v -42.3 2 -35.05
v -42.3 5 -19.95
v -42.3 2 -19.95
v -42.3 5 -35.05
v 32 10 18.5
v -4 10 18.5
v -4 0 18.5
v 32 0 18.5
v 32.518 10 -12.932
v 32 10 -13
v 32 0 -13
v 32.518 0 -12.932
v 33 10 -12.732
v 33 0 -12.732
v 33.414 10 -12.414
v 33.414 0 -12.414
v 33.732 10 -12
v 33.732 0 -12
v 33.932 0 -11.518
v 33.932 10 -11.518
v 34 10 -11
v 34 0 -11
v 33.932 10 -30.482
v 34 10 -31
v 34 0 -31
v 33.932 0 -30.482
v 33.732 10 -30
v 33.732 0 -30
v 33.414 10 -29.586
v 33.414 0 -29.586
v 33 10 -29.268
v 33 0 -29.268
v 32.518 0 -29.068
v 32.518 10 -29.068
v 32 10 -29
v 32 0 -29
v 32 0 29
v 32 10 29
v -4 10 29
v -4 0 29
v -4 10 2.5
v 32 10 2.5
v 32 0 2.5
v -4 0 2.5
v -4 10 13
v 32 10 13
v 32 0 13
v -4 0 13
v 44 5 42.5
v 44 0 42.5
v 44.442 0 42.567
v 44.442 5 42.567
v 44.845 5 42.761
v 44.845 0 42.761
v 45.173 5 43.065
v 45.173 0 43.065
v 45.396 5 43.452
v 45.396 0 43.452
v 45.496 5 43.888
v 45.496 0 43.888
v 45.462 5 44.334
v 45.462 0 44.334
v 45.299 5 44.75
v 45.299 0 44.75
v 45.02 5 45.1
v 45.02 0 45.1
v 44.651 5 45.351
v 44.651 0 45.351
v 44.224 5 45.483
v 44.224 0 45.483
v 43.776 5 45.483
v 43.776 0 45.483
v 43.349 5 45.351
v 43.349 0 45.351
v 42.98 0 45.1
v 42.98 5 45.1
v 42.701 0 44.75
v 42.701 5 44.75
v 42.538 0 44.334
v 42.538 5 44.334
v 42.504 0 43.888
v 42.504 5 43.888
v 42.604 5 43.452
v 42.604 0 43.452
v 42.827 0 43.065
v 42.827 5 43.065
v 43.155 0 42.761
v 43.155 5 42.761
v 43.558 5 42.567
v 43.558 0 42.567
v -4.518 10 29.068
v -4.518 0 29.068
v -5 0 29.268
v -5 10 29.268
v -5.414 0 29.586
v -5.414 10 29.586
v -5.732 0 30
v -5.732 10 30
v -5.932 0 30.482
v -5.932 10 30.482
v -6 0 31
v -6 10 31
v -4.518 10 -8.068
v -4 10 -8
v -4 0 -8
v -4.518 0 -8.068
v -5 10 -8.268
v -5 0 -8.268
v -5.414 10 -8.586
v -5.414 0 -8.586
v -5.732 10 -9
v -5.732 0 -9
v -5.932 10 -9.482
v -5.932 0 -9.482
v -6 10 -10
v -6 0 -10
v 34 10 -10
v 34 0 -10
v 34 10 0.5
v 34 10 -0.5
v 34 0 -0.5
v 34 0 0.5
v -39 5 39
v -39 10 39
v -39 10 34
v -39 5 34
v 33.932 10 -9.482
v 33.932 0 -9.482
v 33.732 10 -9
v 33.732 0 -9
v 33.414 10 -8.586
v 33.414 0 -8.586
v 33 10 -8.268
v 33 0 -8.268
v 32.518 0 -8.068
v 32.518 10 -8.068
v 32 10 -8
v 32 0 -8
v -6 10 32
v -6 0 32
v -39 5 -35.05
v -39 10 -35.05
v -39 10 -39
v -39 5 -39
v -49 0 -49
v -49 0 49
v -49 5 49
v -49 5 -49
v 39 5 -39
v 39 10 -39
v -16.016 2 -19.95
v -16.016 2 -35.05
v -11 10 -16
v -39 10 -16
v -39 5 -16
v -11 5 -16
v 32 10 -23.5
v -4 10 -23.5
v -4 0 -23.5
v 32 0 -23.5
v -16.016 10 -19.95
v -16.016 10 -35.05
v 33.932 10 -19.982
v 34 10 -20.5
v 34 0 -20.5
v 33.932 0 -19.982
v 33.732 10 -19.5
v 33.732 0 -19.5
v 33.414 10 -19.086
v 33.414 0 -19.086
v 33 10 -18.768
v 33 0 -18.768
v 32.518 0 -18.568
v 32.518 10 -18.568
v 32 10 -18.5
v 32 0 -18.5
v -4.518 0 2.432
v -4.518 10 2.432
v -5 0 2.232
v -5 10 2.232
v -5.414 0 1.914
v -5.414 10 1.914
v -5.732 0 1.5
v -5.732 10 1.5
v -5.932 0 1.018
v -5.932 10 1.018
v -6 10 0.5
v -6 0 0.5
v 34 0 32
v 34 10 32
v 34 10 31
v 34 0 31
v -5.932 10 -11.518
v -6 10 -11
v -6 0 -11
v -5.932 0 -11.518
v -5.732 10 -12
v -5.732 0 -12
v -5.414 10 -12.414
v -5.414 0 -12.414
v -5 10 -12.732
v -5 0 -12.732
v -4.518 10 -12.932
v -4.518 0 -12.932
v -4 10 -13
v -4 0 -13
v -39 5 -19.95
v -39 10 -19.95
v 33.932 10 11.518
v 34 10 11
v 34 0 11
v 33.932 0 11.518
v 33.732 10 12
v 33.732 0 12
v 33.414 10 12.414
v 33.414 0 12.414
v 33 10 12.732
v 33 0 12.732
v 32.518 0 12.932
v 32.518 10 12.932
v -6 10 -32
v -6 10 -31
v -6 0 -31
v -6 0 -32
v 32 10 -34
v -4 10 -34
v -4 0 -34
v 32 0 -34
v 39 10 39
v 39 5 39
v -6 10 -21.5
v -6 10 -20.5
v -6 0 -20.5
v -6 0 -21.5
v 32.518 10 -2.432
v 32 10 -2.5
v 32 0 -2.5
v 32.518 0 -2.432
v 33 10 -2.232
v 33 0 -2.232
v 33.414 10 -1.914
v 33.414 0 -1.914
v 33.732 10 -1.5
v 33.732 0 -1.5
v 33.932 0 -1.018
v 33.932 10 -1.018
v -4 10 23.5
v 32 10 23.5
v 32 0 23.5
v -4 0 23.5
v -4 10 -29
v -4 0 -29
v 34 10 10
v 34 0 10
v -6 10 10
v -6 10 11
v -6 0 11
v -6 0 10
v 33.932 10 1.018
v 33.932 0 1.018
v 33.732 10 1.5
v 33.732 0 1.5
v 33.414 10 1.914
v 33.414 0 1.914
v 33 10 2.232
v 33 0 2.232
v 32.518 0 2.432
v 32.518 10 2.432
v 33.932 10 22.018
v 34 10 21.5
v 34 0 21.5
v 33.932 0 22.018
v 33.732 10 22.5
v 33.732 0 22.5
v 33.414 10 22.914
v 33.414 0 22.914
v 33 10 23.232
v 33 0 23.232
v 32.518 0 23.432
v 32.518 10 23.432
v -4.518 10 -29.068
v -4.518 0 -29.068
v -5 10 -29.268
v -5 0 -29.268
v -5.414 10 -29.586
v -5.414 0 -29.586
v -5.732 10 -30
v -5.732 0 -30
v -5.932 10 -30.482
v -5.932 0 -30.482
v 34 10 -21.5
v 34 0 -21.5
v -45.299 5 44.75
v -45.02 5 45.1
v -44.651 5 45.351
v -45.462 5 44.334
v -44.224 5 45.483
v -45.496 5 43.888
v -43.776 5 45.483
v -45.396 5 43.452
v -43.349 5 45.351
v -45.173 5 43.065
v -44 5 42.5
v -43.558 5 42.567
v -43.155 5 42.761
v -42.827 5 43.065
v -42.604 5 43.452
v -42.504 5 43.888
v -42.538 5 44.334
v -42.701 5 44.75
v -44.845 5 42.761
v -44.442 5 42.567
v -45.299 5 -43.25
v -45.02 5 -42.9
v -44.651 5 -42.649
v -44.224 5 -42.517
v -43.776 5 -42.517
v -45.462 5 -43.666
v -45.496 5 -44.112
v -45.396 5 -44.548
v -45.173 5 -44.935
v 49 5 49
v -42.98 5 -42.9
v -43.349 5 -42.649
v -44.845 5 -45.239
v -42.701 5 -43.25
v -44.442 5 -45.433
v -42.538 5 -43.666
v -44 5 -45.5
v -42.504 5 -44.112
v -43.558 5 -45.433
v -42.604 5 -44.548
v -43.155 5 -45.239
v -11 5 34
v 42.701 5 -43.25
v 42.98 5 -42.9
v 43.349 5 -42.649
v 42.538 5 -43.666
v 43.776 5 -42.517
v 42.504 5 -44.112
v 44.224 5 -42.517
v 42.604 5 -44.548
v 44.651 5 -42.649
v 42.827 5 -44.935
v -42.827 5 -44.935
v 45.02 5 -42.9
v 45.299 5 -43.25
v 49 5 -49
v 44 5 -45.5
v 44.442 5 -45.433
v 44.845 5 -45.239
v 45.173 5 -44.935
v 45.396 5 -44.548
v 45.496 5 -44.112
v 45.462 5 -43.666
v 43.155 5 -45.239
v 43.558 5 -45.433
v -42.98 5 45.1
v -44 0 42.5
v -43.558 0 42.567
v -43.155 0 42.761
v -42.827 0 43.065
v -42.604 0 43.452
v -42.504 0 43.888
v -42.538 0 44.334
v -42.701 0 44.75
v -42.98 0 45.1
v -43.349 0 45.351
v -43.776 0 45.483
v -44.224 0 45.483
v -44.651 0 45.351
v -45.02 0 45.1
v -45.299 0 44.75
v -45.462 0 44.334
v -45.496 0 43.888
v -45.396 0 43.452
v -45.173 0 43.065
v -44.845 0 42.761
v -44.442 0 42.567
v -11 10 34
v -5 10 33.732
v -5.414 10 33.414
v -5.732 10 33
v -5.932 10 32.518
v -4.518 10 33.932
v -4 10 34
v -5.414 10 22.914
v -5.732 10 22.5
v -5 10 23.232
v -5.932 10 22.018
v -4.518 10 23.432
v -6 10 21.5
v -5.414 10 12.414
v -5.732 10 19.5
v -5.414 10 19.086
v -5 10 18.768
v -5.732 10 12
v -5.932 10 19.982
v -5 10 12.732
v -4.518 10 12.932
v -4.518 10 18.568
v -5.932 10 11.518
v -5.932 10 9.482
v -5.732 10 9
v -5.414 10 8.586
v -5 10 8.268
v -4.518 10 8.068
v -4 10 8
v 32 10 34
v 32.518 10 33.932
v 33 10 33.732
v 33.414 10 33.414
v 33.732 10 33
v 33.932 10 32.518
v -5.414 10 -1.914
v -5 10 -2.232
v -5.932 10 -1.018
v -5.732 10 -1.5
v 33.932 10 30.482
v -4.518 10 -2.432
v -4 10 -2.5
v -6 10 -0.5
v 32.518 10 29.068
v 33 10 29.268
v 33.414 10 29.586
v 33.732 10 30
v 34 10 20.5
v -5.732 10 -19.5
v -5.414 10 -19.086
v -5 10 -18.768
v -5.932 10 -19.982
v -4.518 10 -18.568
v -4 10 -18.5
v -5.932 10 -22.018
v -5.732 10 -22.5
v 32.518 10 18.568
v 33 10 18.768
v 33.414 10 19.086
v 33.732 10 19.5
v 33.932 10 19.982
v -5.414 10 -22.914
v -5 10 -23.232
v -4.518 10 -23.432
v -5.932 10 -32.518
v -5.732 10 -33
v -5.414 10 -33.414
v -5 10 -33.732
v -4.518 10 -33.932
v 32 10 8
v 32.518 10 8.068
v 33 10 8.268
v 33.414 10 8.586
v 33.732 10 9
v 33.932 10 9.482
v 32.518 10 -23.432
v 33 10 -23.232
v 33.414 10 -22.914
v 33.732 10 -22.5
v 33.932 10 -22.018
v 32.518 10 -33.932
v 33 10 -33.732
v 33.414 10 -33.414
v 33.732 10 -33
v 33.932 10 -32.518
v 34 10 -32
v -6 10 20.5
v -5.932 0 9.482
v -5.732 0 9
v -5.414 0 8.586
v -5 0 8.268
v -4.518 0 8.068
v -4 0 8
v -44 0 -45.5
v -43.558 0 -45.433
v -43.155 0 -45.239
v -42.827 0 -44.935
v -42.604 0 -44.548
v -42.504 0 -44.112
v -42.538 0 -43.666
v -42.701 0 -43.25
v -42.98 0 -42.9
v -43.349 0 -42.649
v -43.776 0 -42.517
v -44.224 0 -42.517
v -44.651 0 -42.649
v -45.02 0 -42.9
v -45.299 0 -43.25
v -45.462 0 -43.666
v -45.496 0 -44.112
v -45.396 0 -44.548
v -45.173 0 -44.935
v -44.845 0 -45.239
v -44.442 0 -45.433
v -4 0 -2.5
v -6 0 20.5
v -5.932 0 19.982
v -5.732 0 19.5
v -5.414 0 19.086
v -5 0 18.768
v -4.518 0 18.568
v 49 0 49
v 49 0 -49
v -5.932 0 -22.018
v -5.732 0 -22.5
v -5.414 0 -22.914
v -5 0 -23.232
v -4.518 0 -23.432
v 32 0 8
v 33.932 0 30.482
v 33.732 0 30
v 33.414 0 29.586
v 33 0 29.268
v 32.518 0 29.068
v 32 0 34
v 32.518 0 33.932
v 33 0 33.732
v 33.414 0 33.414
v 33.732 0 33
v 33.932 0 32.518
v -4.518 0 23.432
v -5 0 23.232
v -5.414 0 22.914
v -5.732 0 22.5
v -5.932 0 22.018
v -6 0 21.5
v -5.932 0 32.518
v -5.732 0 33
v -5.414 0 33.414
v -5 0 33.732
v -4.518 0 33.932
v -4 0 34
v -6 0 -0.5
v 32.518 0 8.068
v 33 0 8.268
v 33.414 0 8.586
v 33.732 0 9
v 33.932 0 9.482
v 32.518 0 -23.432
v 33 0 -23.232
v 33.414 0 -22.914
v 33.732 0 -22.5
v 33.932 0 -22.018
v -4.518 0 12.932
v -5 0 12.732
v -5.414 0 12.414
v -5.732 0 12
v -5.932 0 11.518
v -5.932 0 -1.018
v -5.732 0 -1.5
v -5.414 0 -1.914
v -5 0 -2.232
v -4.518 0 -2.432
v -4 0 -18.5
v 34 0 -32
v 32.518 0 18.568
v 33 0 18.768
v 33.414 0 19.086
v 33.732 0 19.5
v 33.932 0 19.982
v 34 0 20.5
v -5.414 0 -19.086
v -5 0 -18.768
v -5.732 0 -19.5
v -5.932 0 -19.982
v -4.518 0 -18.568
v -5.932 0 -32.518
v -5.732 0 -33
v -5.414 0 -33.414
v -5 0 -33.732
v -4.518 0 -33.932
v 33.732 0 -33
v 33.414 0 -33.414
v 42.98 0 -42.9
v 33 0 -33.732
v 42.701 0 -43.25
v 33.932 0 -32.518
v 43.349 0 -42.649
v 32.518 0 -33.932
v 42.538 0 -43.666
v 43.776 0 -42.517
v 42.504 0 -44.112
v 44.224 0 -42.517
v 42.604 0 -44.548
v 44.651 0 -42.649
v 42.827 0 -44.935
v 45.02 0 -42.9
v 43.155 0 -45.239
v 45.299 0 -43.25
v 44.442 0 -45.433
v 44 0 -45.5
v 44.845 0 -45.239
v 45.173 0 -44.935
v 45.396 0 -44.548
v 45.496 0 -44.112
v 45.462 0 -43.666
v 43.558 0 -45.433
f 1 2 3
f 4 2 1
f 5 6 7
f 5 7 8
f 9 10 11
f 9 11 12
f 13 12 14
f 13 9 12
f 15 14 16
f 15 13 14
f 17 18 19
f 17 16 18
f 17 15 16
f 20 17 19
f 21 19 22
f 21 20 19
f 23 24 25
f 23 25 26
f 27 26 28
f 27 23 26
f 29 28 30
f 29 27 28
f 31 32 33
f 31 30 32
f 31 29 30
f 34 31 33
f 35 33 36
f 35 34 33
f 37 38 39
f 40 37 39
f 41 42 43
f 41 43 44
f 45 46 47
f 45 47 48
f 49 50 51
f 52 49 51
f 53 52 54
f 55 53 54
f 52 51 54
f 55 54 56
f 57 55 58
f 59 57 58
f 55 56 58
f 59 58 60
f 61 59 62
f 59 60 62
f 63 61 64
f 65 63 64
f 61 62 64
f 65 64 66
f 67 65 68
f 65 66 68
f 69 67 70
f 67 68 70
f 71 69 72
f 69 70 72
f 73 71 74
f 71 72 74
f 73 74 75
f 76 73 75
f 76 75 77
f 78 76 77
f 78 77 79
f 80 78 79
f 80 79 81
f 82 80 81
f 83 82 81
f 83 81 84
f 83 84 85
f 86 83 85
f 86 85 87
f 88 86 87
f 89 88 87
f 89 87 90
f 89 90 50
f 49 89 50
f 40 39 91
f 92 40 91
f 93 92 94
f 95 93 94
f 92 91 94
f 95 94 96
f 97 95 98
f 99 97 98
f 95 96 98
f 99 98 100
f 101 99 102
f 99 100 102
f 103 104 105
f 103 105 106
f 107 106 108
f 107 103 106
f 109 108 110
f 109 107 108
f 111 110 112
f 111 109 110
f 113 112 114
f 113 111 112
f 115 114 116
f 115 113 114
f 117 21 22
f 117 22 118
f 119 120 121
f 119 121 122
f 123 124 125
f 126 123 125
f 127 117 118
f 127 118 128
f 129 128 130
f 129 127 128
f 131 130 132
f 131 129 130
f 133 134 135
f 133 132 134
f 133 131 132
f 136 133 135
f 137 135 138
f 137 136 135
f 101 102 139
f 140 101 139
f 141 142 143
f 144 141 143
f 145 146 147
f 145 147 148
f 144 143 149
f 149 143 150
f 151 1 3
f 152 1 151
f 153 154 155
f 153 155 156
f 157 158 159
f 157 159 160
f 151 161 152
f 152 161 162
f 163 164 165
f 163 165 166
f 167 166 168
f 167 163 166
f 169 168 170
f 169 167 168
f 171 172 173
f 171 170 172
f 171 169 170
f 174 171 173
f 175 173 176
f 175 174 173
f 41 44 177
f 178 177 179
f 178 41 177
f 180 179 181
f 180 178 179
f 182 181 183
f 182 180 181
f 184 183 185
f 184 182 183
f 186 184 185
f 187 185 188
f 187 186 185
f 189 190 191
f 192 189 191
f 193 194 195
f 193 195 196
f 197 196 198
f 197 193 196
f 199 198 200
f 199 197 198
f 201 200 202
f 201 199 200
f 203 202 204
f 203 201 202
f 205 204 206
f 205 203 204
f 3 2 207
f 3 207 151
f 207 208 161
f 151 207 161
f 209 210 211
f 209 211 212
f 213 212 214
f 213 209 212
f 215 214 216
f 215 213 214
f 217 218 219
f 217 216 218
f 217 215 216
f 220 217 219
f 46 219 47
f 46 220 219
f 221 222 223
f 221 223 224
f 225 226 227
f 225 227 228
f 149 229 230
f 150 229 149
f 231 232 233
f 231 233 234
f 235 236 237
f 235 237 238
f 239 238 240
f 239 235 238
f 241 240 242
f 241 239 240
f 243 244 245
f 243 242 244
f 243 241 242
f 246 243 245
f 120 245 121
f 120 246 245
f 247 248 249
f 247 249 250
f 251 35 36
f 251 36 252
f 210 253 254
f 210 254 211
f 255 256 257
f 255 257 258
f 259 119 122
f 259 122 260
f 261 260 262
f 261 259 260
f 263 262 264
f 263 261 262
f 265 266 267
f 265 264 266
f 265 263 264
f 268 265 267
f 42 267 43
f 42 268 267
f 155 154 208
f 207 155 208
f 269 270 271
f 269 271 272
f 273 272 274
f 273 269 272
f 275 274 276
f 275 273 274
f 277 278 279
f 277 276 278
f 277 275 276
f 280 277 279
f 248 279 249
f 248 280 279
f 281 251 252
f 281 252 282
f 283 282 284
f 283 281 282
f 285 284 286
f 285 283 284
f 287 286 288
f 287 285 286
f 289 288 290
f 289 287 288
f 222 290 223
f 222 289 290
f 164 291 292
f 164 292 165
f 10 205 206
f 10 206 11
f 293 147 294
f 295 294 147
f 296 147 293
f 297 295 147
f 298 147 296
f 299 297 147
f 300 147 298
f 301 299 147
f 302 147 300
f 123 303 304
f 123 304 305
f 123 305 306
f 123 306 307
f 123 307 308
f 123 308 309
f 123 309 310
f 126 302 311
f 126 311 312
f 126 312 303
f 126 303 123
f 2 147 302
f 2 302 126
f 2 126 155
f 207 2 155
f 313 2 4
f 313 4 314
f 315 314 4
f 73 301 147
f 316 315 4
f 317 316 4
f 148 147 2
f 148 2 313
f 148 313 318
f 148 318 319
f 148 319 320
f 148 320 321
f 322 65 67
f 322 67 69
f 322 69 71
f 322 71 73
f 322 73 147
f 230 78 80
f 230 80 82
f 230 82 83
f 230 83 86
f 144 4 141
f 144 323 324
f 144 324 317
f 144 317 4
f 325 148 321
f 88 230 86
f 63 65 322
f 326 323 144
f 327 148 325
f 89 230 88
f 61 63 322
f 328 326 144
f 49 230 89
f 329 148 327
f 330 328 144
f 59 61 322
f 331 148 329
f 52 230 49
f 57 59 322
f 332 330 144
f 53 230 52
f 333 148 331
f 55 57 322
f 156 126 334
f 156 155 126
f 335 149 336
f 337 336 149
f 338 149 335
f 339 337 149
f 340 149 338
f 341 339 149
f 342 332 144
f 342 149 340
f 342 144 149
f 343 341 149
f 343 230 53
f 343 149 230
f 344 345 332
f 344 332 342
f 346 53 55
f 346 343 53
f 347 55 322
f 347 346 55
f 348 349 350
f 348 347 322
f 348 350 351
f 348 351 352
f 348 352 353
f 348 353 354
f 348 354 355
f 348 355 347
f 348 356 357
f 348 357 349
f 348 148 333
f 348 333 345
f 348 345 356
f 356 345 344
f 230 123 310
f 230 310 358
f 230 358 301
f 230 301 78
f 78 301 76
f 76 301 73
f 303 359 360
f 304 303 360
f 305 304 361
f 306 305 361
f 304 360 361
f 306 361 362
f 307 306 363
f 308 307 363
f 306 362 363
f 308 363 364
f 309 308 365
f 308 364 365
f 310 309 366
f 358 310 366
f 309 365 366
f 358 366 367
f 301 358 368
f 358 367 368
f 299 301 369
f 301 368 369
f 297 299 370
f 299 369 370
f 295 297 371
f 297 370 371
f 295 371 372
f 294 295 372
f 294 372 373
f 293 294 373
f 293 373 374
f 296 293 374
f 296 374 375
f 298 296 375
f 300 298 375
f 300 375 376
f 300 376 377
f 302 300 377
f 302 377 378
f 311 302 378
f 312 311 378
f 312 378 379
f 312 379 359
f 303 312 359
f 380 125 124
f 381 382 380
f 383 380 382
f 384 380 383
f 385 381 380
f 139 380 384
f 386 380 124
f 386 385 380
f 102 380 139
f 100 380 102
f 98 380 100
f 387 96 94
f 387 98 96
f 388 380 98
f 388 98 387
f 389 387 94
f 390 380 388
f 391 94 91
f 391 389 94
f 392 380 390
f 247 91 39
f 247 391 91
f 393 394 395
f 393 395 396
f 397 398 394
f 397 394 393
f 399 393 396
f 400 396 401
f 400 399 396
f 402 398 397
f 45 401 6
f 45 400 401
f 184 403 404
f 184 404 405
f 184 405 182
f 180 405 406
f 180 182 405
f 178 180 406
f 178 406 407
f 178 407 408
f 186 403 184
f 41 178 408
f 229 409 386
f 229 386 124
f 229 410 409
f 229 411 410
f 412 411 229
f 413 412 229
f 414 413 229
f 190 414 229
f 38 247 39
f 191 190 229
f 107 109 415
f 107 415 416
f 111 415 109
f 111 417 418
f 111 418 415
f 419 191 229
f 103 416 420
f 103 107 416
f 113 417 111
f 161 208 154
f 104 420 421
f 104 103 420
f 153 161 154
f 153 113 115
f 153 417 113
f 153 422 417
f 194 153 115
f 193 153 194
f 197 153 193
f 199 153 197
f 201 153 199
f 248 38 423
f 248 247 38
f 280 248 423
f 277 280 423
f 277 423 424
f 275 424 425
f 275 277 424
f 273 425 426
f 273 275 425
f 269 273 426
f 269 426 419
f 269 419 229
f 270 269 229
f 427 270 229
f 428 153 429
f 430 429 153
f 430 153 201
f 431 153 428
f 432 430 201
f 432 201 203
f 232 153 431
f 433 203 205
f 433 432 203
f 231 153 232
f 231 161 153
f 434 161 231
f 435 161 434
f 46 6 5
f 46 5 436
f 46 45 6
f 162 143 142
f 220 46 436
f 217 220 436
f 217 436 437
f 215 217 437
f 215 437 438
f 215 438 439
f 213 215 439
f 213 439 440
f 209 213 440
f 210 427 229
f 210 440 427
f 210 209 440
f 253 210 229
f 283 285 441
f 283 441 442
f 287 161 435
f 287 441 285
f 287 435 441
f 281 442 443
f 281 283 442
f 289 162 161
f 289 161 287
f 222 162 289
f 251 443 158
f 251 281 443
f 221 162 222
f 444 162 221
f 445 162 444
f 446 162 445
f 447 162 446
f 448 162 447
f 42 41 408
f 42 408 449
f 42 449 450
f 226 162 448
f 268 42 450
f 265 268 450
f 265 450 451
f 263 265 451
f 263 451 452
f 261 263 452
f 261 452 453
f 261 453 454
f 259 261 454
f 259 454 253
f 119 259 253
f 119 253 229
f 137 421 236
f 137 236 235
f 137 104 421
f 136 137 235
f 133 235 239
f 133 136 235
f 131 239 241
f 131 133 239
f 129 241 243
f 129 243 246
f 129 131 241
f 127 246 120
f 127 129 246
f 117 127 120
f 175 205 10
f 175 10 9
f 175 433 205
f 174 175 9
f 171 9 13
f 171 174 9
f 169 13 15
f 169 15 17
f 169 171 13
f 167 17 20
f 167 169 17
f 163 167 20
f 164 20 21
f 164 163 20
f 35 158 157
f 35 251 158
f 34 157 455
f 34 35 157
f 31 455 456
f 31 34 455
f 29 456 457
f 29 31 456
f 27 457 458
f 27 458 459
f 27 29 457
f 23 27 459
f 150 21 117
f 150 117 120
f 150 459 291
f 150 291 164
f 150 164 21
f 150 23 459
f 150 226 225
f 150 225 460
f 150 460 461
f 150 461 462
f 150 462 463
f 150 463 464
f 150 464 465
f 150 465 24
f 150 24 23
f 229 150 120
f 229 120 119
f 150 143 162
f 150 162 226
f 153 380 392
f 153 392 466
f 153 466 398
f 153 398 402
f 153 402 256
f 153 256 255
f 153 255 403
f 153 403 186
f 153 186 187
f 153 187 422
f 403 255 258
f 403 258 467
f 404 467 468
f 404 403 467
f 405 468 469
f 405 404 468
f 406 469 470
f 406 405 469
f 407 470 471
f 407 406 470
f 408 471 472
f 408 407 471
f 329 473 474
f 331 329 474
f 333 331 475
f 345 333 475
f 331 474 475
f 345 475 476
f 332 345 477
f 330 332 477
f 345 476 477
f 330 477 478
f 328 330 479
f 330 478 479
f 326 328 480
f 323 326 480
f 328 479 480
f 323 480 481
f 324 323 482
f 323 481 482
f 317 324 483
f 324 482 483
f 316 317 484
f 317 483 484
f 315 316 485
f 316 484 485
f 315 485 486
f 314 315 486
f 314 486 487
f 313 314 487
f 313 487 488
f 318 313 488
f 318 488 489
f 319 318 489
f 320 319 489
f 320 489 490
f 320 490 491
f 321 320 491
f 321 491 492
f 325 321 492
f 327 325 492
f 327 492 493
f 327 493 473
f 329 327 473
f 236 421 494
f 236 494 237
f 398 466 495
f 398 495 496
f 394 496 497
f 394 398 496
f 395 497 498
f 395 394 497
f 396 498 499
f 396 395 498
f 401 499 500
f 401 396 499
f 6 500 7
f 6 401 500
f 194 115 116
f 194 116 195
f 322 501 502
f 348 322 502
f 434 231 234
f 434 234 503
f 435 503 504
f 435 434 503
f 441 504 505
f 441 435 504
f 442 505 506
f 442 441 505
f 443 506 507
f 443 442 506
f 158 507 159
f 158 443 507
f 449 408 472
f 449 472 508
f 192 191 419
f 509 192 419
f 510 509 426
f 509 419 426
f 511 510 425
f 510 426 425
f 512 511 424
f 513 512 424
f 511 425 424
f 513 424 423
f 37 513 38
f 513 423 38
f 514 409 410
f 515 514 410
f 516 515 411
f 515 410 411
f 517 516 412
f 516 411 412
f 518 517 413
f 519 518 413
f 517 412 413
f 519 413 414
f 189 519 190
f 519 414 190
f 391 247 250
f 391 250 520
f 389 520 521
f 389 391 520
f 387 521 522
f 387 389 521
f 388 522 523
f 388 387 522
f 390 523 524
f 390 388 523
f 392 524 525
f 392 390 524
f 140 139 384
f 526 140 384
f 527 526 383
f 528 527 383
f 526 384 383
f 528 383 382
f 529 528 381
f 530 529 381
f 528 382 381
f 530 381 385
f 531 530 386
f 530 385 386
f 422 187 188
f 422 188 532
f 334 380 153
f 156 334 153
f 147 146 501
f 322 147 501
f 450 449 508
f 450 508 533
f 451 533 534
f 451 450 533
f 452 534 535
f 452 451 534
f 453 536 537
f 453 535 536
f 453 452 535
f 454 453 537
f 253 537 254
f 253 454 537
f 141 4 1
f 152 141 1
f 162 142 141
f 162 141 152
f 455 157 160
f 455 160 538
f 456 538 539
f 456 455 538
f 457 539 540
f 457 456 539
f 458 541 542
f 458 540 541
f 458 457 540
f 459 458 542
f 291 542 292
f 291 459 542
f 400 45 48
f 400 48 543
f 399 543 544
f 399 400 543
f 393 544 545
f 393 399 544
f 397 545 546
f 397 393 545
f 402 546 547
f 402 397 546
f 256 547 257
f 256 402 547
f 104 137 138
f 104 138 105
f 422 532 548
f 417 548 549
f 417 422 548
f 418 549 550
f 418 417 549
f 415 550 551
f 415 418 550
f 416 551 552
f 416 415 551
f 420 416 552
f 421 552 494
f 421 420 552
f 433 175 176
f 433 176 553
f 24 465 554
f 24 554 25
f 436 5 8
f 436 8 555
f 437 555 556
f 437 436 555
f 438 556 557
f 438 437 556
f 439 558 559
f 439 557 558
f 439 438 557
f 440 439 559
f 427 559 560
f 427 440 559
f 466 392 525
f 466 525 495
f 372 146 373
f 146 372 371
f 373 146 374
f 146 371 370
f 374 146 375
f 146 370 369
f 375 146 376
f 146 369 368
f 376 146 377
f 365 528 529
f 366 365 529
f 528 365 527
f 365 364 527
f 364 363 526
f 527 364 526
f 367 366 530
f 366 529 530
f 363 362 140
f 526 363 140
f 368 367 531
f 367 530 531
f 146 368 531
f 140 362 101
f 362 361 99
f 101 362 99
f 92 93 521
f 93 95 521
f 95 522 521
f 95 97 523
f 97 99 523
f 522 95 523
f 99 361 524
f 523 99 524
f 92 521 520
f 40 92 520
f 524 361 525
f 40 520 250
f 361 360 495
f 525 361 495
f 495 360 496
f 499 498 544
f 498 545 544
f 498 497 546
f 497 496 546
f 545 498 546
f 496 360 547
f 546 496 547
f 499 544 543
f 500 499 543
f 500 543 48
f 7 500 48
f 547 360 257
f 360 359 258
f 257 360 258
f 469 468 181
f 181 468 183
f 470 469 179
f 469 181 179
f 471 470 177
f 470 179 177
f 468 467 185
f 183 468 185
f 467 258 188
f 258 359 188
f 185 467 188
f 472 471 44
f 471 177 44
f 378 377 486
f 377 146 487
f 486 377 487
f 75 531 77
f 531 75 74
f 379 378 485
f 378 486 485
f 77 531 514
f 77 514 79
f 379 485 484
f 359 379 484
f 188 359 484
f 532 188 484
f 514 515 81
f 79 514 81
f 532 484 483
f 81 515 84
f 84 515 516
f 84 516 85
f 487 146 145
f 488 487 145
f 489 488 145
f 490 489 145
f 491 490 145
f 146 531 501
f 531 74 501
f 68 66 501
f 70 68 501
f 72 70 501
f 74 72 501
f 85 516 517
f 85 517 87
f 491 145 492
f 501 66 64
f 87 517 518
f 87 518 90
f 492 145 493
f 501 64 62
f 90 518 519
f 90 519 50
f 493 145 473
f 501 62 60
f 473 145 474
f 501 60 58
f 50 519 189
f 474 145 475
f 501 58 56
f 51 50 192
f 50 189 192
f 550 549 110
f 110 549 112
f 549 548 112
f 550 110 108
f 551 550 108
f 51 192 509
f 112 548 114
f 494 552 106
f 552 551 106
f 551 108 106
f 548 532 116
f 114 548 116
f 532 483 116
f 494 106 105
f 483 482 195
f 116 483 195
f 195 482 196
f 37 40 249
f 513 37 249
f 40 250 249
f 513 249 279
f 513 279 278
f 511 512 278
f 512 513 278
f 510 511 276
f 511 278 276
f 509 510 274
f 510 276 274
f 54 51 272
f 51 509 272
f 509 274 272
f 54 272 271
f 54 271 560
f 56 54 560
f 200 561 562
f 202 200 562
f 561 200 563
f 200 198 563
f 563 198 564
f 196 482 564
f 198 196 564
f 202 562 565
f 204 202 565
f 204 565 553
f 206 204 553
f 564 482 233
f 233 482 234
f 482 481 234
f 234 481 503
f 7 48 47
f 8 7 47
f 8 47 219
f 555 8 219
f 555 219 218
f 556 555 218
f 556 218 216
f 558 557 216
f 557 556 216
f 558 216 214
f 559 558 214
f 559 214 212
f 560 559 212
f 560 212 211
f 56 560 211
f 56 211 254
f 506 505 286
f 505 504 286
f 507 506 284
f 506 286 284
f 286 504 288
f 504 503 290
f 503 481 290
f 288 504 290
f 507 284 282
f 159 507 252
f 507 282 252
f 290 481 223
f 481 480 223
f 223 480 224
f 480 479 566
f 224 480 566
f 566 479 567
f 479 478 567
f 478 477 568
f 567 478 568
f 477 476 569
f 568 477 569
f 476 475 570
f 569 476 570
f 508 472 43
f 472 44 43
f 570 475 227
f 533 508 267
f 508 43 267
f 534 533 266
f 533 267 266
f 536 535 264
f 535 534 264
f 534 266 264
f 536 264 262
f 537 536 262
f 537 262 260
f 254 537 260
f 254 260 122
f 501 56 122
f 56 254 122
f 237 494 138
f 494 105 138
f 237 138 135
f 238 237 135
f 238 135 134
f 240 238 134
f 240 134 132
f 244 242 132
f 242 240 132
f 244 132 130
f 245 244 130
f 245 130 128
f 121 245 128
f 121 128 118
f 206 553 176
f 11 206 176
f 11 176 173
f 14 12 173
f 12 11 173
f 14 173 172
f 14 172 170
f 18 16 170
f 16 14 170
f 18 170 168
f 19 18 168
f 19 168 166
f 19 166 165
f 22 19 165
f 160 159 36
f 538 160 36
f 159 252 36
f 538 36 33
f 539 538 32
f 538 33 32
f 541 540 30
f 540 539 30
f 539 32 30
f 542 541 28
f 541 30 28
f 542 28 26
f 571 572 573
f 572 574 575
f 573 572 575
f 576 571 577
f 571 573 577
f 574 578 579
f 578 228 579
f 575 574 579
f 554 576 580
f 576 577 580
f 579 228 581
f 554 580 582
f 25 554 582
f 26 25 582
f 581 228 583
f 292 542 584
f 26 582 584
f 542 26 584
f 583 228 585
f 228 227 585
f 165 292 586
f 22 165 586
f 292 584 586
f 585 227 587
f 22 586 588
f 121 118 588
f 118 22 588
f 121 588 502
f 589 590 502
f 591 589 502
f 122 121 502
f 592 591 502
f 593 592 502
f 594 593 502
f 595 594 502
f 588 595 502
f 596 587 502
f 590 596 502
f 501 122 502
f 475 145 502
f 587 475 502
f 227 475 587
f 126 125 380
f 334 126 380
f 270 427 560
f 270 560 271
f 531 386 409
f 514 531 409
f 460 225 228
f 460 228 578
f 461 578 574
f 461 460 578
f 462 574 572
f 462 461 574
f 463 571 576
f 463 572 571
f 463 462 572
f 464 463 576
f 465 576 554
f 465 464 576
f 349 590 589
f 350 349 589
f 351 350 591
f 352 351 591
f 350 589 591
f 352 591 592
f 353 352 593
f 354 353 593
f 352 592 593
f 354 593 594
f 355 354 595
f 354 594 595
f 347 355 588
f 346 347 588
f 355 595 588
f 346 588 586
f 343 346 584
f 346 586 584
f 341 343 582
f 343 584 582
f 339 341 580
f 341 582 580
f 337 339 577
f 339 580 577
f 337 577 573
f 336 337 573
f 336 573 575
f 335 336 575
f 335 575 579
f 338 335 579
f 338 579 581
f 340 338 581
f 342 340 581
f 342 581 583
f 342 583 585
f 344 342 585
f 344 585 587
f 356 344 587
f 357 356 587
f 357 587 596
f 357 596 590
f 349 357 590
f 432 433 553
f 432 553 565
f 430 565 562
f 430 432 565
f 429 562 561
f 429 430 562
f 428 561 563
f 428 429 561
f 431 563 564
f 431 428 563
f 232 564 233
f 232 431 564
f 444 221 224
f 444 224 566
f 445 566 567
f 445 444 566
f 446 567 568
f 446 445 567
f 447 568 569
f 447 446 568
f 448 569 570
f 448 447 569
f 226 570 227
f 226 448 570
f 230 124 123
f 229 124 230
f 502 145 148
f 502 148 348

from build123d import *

# Parameters (mm, degrees)
SKETCH1_W           = 98
SKETCH1_H           = 98
BOSS_EXTRUDE1_DEPTH = 10
SKETCH8_W           = 98
SKETCH8_H           = 98
SKETCH8_W_2         = 78
SKETCH8_H_2         = 78
CUT_EXTRUDE5_DEPTH  = 5
SKETCH9_W           = 28
SKETCH9_H           = 50
CUT_EXTRUDE6_DEPTH  = 5
SKETCH11_W          = 22.983747508
SKETCH11_H          = 15.1
CUT_EXTRUDE7_DEPTH  = 8
SKETCH12_W          = 3.3
SKETCH12_H          = 15.1
CUT_EXTRUDE8_DEPTH  = 3
CUT_EXTRUDE10_DEPTH = 16
SKETCH14_R          = 1.5
CUT_EXTRUDE11_DEPTH = 10


with BuildPart() as part:
    # Sketch1 → Boss-Extrude1 (new body)
    with BuildSketch(Plane(origin=(0, 0, 0), x_dir=(1, 0, 0), z_dir=(0, 1, 0))):
        Rectangle(SKETCH1_W, SKETCH1_H)
    extrude(amount=BOSS_EXTRUDE1_DEPTH)

    # Sketch8 → Cut-Extrude5 (cut)
    with BuildSketch(Plane(origin=(0, 10, 0), x_dir=(1, 0, 0), z_dir=(0, 1, 0))):
        Rectangle(SKETCH8_W, SKETCH8_H)
        Rectangle(SKETCH8_W_2, SKETCH8_H_2, mode=Mode.SUBTRACT)
    extrude(amount=-CUT_EXTRUDE5_DEPTH, mode=Mode.SUBTRACT)

    # Sketch9 → Cut-Extrude6 (cut)
    with BuildSketch(Plane(origin=(0, 10, 0), x_dir=(1, 0, 0), z_dir=(0, 1, 0))):
        with Locations((-25, -9)):
            Rectangle(SKETCH9_W, SKETCH9_H)
    extrude(amount=-CUT_EXTRUDE6_DEPTH, mode=Mode.SUBTRACT)

    # Sketch11 → Cut-Extrude7 (cut)
    with BuildSketch(Plane(origin=(0, 10, 0), x_dir=(1, 0, 0), z_dir=(0, 1, 0))):
        with Locations((-27.508126246, 27.5)):
            Rectangle(SKETCH11_W, SKETCH11_H)
    extrude(amount=-CUT_EXTRUDE7_DEPTH, mode=Mode.SUBTRACT)

    # Sketch12 → Cut-Extrude8 (cut)
    with BuildSketch(Plane(origin=(0, 5, 0), x_dir=(1, 0, 0), z_dir=(0, 1, 0))):
        with Locations((-40.65, 27.5)):
            Rectangle(SKETCH12_W, SKETCH12_H)
    extrude(amount=-CUT_EXTRUDE8_DEPTH, mode=Mode.SUBTRACT)

    # Sketch13 → Cut-Extrude10 (cut)
    with BuildSketch(Plane(origin=(0, 10, 0), x_dir=(1, 0, 0), z_dir=(0, 1, 0))):
        with BuildLine():
            Line((-4, -18.5), (32, -18.5))
            ThreePointArc((32, -18.5), (33.414213562, -19.085786438), (34, -20.5))
            Line((34, -20.5), (34, -21.5))
            ThreePointArc((34, -21.5), (33.414213562, -22.914213562), (32, -23.5))
            Line((32, -23.5), (-4, -23.5))
            ThreePointArc((-4, -23.5), (-5.414213562, -22.914213562), (-6, -21.5))
            Line((-6, -21.5), (-6, -20.5))
            ThreePointArc((-6, -20.5), (-5.414213562, -19.085786438), (-4, -18.5))
        make_face()
        with BuildLine():
            Line((-4, -34), (32, -34))
            ThreePointArc((32, -34), (33.414213562, -33.414213562), (34, -32))
            Line((34, -32), (34, -31))
            ThreePointArc((34, -31), (33.414213562, -29.585786438), (32, -29))
            Line((32, -29), (-4, -29))
            ThreePointArc((-4, -29), (-5.414213562, -29.585786438), (-6, -31))
            Line((-6, -31), (-6, -32))
            ThreePointArc((-6, -32), (-5.414213562, -33.414213562), (-4, -34))
        make_face()
        with BuildLine():
            Line((-4, -8), (32, -8))
            ThreePointArc((32, -8), (33.414213562, -8.585786438), (34, -10))
            Line((34, -10), (34, -11))
            ThreePointArc((34, -11), (33.414213562, -12.414213562), (32, -13))
            Line((32, -13), (-4, -13))
            ThreePointArc((-4, -13), (-5.414213562, -12.414213562), (-6, -11))
            Line((-6, -11), (-6, -10))
            ThreePointArc((-6, -10), (-5.414213562, -8.585786438), (-4, -8))
        make_face()
        with BuildLine():
            Line((-4, 2.5), (32, 2.5))
            ThreePointArc((32, 2.5), (33.414213562, 1.914213562), (34, 0.5))
            Line((34, 0.5), (34, -0.5))
            ThreePointArc((34, -0.5), (33.414213562, -1.914213562), (32, -2.5))
            Line((32, -2.5), (-4, -2.5))
            ThreePointArc((-4, -2.5), (-5.414213562, -1.914213562), (-6, -0.5))
            Line((-6, -0.5), (-6, 0.5))
            ThreePointArc((-6, 0.5), (-5.414213562, 1.914213562), (-4, 2.5))
        make_face()
        with BuildLine():
            Line((-4, 13), (32, 13))
            ThreePointArc((32, 13), (33.414213562, 12.414213562), (34, 11))
            Line((34, 11), (34, 10))
            ThreePointArc((34, 10), (33.414213562, 8.585786438), (32, 8))
            Line((32, 8), (-4, 8))
            ThreePointArc((-4, 8), (-5.414213562, 8.585786438), (-6, 10))
            Line((-6, 10), (-6, 11))
            ThreePointArc((-6, 11), (-5.414213562, 12.414213562), (-4, 13))
        make_face()
        with BuildLine():
            Line((-4, 23.5), (32, 23.5))
            ThreePointArc((32, 23.5), (33.414213562, 22.914213562), (34, 21.5))
            Line((34, 21.5), (34, 20.5))
            ThreePointArc((34, 20.5), (33.414213562, 19.085786438), (32, 18.5))
            Line((32, 18.5), (-4, 18.5))
            ThreePointArc((-4, 18.5), (-5.414213562, 19.085786438), (-6, 20.5))
            Line((-6, 20.5), (-6, 21.5))
            ThreePointArc((-6, 21.5), (-5.414213562, 22.914213562), (-4, 23.5))
        make_face()
        with BuildLine():
            Line((-4, 34), (32, 34))
            ThreePointArc((32, 34), (33.414213562, 33.414213562), (34, 32))
            Line((34, 32), (34, 31))
            ThreePointArc((34, 31), (33.414213562, 29.585786438), (32, 29))
            Line((32, 29), (-4, 29))
            ThreePointArc((-4, 29), (-5.414213562, 29.585786438), (-6, 31))
            Line((-6, 31), (-6, 32))
            ThreePointArc((-6, 32), (-5.414213562, 33.414213562), (-4, 34))
        make_face()
    extrude(amount=-CUT_EXTRUDE10_DEPTH, mode=Mode.SUBTRACT)

    # Sketch14 → Cut-Extrude11 (cut)
    with BuildSketch(Plane.XZ):
        with Locations(Location((-44, -44, 0), (0, 0, 270))):
            Circle(SKETCH14_R)
        with Locations(Location((-44, 44, 0), (0, 0, 270))):
            Circle(SKETCH14_R)
        with Locations(Location((44, 44, 0), (0, 0, 270))):
            Circle(SKETCH14_R)
        with Locations(Location((44, -44, 0), (0, 0, 270))):
            Circle(SKETCH14_R)
    extrude(amount=-CUT_EXTRUDE11_DEPTH, mode=Mode.SUBTRACT)


solid = part.part
